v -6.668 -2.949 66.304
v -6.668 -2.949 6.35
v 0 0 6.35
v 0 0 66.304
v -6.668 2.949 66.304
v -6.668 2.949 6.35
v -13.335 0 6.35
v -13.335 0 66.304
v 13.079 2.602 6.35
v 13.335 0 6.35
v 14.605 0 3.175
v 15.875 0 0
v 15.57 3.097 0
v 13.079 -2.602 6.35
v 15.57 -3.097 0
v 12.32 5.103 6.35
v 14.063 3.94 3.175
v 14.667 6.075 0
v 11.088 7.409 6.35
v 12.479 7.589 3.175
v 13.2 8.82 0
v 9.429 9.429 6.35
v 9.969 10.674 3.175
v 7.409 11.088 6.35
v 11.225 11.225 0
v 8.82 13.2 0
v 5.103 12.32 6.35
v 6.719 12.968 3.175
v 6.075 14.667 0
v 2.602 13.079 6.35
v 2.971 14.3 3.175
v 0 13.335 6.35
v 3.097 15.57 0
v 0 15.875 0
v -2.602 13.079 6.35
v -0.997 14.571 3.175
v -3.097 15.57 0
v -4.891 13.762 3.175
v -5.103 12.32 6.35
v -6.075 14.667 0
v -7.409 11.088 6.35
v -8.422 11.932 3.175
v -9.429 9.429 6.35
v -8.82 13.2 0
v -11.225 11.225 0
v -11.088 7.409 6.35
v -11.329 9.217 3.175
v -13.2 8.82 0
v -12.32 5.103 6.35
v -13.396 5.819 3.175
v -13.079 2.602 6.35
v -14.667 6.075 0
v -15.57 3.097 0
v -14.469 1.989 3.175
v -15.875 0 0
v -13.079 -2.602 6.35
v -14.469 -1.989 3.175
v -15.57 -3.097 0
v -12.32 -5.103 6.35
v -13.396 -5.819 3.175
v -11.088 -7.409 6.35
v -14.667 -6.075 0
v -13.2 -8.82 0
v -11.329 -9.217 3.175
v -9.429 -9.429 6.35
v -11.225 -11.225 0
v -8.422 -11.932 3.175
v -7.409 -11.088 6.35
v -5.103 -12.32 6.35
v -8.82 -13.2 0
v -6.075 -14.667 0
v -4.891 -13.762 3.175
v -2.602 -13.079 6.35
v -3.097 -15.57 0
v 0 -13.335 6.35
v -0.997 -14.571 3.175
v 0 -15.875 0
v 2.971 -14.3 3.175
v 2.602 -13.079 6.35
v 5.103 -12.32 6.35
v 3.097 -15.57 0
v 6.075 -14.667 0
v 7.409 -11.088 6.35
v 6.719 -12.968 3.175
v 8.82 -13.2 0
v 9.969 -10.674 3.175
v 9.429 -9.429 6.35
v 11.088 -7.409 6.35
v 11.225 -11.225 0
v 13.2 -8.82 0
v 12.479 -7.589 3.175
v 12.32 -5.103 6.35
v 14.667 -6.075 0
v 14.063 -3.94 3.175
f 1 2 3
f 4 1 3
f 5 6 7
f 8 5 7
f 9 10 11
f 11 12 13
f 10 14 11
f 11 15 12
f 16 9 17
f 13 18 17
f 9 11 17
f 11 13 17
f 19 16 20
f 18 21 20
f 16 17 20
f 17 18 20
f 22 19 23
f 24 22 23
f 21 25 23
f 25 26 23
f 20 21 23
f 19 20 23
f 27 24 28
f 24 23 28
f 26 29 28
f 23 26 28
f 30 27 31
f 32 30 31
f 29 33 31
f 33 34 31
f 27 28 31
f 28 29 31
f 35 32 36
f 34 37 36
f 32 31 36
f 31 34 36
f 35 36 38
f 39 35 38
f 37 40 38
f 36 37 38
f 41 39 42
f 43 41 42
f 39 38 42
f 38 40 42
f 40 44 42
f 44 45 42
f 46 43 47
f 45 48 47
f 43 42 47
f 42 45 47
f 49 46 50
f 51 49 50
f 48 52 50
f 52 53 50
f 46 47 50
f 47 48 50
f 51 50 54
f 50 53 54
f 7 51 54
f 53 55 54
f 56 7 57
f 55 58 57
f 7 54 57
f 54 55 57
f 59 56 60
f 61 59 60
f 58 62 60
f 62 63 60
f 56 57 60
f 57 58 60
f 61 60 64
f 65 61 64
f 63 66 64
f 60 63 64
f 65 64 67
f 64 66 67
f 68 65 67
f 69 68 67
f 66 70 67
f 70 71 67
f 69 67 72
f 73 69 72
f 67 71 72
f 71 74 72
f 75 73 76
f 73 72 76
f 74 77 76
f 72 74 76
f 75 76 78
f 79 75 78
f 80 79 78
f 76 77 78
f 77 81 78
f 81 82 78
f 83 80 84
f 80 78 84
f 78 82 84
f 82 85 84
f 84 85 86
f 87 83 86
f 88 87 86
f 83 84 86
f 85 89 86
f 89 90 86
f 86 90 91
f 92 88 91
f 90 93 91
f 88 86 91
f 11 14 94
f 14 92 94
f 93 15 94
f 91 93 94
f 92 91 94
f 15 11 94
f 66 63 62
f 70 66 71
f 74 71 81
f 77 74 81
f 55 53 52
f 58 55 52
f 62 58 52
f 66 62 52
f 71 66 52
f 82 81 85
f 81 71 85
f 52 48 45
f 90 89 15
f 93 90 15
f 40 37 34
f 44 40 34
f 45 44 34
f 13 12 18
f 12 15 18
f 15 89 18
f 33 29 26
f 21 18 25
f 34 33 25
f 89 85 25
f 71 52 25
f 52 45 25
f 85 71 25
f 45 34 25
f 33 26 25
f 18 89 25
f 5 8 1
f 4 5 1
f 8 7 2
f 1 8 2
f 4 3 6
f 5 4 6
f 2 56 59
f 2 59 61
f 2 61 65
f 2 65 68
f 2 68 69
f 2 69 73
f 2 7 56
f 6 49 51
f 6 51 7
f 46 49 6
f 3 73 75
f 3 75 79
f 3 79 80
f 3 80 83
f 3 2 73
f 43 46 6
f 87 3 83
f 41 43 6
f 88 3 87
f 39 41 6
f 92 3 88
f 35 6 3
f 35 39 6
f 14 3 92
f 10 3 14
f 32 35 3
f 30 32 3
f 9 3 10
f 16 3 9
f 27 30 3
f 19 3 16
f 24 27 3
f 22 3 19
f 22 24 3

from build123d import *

# Parameters (mm, degrees)
F0_R     = 15.875
F1_DEPTH = 6.35
F2_SIZE2 = 6.34999
F2_SIZE  = 2.53999
F4_DEPTH = 59.95412


# Not quite as in the source:
# - a fillet or chamfer is up to 0.001 mm smaller than in the source, because OpenCascade refuses the exact size


with BuildPart() as f1:
    # F0 (on Top) → F1 (new body)
    with BuildSketch(Plane.XY):
        Circle(F0_R)
    extrude(amount=F1_DEPTH)

    # F2 (size 2.54 and 6.35 in the source; OpenCascade refuses exactly that, so slightly less here)
    f2_edges = [f1.edges().sort_by_distance(p)[0] for p in [
        (-15.875, 0, 6.35),
    ]]
    f2_side = f1.faces().sort_by_distance((0, 0, 6.35))[0]
    chamfer(f2_edges, length=F2_SIZE, length2=F2_SIZE2, reference=f2_side)

    # F3 (on face) → F4 (join)
    with BuildSketch(Plane.XY.offset(6.35)):
        Polygon((-6.6675, 2.9491111636), (-13.335, 0), (-6.6675, -2.9491111636), (0, 0), align=None)
    extrude(amount=F4_DEPTH)


solid = f1.part
